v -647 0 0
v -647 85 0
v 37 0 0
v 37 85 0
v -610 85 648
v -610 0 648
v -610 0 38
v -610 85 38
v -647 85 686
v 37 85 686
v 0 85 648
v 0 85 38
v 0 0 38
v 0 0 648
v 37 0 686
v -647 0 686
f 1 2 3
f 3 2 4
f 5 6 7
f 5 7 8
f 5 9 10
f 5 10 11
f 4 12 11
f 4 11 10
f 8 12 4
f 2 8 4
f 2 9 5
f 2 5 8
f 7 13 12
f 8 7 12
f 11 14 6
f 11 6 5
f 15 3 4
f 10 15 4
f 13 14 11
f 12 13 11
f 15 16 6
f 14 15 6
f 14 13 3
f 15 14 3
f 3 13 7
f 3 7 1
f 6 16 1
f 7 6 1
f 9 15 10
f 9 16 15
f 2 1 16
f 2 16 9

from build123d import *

# Parameters (mm, degrees)
SKETCH1_W             = 37
SKETCH1_H             = 85
BOSS_EXTRUDE1_DEPTH   = 686
BOSS_EXTRUDE1_2_DEPTH = 686
SKETCH2_W             = 38
SKETCH2_H             = 85
BOSS_EXTRUDE2_DEPTH   = 610


with BuildPart() as part:
    # Sketch1 → Boss-Extrude1 (new body)
    with BuildSketch(Plane.XY):
        with Locations((18.5, 42.5)):
            Rectangle(SKETCH1_W, SKETCH1_H)
    extrude(amount=BOSS_EXTRUDE1_DEPTH)



with BuildPart() as body_2:
    # Sketch1 → Boss-Extrude1 2 (new body)
    with BuildSketch(Plane.XY):
        with Locations((-628.5, 42.5)):
            Rectangle(SKETCH1_W, SKETCH1_H)
    extrude(amount=BOSS_EXTRUDE1_2_DEPTH)


with BuildPart() as part_1:
    add(part.part)

    add(body_2.part)  # Boss-Extrude2 merges body 2
    # Sketch2 → Boss-Extrude2 (add)
    with BuildSketch(Plane(origin=(-610, 0, 0), x_dir=(0, 0, -1), z_dir=(1, 0, 0))):
        with Locations((-667, 42.5)):
            Rectangle(SKETCH2_W, SKETCH2_H)
        with Locations((-19, 42.5)):
            Rectangle(SKETCH2_W, SKETCH2_H)
    extrude(amount=BOSS_EXTRUDE2_DEPTH)


solid = part_1.part
